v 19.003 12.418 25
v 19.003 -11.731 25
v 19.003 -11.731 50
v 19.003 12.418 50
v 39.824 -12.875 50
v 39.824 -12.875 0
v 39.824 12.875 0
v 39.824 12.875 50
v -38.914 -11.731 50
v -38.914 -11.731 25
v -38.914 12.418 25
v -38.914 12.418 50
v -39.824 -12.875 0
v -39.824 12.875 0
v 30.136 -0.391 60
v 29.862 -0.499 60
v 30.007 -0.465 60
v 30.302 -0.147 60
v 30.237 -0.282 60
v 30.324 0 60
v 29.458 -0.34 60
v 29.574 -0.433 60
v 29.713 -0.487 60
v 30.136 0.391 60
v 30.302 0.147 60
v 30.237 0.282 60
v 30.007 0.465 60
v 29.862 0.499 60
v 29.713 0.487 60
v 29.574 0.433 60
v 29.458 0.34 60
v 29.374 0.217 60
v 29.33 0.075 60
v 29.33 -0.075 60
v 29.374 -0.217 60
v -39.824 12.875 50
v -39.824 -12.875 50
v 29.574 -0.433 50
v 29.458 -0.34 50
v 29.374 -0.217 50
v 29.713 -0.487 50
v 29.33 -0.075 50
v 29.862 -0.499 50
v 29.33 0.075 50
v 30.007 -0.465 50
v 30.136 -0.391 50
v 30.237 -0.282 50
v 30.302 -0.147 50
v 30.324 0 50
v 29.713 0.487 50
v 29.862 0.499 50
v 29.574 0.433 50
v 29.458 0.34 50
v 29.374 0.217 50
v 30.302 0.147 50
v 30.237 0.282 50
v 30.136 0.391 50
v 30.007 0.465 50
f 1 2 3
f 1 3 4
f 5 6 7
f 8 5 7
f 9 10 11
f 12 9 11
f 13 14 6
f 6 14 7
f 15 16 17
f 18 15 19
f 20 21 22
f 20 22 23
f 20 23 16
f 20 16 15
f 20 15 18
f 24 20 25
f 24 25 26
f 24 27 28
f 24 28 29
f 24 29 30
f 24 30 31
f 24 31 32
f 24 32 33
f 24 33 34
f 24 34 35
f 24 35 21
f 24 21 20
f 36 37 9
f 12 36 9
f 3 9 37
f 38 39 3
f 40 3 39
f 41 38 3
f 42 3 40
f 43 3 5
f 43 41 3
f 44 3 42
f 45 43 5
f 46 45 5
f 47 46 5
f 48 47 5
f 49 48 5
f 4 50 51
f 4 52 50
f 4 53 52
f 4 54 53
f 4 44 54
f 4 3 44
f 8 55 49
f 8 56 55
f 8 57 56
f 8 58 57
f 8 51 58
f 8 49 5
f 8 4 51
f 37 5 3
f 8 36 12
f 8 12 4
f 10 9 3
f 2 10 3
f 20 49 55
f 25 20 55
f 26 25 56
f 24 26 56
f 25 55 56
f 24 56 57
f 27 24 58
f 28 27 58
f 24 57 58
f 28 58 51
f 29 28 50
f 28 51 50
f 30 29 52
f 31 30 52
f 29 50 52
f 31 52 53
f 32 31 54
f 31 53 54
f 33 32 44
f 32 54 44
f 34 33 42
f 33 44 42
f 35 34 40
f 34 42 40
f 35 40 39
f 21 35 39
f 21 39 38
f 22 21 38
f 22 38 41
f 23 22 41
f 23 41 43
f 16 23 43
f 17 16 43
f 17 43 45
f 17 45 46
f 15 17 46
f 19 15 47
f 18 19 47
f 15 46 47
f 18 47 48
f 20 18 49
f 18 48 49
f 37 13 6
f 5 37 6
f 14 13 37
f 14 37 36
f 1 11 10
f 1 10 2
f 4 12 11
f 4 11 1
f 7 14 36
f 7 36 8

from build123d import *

# Parameters (mm, degrees)
F0_W     = 79.648294
F0_H     = 25.750952
F1_DEPTH = 50
F2_W     = 57.916386
F2_H     = 24.148573
F3_DEPTH = 25
F4_R     = 0.5
F5_DEPTH = 10


with BuildPart() as f1:
    # F0 (on Top) → F1 (new body)
    with BuildSketch(Plane.XY):
        Rectangle(F0_W, F0_H)
    extrude(amount=F1_DEPTH)

    # F2 (on face) → F3 (cut)
    with BuildSketch(Plane.XY.offset(50)):
        with Locations((-9.955351, 0.343398)):
            Rectangle(F2_W, F2_H)
    extrude(amount=-F3_DEPTH, mode=Mode.SUBTRACT)

    # F4 (on face) → F5 (join)
    with BuildSketch(Plane.XY.offset(50)):
        with Locations((29.824147, 0)):
            Circle(F4_R)
    extrude(amount=F5_DEPTH)


solid = f1.part
